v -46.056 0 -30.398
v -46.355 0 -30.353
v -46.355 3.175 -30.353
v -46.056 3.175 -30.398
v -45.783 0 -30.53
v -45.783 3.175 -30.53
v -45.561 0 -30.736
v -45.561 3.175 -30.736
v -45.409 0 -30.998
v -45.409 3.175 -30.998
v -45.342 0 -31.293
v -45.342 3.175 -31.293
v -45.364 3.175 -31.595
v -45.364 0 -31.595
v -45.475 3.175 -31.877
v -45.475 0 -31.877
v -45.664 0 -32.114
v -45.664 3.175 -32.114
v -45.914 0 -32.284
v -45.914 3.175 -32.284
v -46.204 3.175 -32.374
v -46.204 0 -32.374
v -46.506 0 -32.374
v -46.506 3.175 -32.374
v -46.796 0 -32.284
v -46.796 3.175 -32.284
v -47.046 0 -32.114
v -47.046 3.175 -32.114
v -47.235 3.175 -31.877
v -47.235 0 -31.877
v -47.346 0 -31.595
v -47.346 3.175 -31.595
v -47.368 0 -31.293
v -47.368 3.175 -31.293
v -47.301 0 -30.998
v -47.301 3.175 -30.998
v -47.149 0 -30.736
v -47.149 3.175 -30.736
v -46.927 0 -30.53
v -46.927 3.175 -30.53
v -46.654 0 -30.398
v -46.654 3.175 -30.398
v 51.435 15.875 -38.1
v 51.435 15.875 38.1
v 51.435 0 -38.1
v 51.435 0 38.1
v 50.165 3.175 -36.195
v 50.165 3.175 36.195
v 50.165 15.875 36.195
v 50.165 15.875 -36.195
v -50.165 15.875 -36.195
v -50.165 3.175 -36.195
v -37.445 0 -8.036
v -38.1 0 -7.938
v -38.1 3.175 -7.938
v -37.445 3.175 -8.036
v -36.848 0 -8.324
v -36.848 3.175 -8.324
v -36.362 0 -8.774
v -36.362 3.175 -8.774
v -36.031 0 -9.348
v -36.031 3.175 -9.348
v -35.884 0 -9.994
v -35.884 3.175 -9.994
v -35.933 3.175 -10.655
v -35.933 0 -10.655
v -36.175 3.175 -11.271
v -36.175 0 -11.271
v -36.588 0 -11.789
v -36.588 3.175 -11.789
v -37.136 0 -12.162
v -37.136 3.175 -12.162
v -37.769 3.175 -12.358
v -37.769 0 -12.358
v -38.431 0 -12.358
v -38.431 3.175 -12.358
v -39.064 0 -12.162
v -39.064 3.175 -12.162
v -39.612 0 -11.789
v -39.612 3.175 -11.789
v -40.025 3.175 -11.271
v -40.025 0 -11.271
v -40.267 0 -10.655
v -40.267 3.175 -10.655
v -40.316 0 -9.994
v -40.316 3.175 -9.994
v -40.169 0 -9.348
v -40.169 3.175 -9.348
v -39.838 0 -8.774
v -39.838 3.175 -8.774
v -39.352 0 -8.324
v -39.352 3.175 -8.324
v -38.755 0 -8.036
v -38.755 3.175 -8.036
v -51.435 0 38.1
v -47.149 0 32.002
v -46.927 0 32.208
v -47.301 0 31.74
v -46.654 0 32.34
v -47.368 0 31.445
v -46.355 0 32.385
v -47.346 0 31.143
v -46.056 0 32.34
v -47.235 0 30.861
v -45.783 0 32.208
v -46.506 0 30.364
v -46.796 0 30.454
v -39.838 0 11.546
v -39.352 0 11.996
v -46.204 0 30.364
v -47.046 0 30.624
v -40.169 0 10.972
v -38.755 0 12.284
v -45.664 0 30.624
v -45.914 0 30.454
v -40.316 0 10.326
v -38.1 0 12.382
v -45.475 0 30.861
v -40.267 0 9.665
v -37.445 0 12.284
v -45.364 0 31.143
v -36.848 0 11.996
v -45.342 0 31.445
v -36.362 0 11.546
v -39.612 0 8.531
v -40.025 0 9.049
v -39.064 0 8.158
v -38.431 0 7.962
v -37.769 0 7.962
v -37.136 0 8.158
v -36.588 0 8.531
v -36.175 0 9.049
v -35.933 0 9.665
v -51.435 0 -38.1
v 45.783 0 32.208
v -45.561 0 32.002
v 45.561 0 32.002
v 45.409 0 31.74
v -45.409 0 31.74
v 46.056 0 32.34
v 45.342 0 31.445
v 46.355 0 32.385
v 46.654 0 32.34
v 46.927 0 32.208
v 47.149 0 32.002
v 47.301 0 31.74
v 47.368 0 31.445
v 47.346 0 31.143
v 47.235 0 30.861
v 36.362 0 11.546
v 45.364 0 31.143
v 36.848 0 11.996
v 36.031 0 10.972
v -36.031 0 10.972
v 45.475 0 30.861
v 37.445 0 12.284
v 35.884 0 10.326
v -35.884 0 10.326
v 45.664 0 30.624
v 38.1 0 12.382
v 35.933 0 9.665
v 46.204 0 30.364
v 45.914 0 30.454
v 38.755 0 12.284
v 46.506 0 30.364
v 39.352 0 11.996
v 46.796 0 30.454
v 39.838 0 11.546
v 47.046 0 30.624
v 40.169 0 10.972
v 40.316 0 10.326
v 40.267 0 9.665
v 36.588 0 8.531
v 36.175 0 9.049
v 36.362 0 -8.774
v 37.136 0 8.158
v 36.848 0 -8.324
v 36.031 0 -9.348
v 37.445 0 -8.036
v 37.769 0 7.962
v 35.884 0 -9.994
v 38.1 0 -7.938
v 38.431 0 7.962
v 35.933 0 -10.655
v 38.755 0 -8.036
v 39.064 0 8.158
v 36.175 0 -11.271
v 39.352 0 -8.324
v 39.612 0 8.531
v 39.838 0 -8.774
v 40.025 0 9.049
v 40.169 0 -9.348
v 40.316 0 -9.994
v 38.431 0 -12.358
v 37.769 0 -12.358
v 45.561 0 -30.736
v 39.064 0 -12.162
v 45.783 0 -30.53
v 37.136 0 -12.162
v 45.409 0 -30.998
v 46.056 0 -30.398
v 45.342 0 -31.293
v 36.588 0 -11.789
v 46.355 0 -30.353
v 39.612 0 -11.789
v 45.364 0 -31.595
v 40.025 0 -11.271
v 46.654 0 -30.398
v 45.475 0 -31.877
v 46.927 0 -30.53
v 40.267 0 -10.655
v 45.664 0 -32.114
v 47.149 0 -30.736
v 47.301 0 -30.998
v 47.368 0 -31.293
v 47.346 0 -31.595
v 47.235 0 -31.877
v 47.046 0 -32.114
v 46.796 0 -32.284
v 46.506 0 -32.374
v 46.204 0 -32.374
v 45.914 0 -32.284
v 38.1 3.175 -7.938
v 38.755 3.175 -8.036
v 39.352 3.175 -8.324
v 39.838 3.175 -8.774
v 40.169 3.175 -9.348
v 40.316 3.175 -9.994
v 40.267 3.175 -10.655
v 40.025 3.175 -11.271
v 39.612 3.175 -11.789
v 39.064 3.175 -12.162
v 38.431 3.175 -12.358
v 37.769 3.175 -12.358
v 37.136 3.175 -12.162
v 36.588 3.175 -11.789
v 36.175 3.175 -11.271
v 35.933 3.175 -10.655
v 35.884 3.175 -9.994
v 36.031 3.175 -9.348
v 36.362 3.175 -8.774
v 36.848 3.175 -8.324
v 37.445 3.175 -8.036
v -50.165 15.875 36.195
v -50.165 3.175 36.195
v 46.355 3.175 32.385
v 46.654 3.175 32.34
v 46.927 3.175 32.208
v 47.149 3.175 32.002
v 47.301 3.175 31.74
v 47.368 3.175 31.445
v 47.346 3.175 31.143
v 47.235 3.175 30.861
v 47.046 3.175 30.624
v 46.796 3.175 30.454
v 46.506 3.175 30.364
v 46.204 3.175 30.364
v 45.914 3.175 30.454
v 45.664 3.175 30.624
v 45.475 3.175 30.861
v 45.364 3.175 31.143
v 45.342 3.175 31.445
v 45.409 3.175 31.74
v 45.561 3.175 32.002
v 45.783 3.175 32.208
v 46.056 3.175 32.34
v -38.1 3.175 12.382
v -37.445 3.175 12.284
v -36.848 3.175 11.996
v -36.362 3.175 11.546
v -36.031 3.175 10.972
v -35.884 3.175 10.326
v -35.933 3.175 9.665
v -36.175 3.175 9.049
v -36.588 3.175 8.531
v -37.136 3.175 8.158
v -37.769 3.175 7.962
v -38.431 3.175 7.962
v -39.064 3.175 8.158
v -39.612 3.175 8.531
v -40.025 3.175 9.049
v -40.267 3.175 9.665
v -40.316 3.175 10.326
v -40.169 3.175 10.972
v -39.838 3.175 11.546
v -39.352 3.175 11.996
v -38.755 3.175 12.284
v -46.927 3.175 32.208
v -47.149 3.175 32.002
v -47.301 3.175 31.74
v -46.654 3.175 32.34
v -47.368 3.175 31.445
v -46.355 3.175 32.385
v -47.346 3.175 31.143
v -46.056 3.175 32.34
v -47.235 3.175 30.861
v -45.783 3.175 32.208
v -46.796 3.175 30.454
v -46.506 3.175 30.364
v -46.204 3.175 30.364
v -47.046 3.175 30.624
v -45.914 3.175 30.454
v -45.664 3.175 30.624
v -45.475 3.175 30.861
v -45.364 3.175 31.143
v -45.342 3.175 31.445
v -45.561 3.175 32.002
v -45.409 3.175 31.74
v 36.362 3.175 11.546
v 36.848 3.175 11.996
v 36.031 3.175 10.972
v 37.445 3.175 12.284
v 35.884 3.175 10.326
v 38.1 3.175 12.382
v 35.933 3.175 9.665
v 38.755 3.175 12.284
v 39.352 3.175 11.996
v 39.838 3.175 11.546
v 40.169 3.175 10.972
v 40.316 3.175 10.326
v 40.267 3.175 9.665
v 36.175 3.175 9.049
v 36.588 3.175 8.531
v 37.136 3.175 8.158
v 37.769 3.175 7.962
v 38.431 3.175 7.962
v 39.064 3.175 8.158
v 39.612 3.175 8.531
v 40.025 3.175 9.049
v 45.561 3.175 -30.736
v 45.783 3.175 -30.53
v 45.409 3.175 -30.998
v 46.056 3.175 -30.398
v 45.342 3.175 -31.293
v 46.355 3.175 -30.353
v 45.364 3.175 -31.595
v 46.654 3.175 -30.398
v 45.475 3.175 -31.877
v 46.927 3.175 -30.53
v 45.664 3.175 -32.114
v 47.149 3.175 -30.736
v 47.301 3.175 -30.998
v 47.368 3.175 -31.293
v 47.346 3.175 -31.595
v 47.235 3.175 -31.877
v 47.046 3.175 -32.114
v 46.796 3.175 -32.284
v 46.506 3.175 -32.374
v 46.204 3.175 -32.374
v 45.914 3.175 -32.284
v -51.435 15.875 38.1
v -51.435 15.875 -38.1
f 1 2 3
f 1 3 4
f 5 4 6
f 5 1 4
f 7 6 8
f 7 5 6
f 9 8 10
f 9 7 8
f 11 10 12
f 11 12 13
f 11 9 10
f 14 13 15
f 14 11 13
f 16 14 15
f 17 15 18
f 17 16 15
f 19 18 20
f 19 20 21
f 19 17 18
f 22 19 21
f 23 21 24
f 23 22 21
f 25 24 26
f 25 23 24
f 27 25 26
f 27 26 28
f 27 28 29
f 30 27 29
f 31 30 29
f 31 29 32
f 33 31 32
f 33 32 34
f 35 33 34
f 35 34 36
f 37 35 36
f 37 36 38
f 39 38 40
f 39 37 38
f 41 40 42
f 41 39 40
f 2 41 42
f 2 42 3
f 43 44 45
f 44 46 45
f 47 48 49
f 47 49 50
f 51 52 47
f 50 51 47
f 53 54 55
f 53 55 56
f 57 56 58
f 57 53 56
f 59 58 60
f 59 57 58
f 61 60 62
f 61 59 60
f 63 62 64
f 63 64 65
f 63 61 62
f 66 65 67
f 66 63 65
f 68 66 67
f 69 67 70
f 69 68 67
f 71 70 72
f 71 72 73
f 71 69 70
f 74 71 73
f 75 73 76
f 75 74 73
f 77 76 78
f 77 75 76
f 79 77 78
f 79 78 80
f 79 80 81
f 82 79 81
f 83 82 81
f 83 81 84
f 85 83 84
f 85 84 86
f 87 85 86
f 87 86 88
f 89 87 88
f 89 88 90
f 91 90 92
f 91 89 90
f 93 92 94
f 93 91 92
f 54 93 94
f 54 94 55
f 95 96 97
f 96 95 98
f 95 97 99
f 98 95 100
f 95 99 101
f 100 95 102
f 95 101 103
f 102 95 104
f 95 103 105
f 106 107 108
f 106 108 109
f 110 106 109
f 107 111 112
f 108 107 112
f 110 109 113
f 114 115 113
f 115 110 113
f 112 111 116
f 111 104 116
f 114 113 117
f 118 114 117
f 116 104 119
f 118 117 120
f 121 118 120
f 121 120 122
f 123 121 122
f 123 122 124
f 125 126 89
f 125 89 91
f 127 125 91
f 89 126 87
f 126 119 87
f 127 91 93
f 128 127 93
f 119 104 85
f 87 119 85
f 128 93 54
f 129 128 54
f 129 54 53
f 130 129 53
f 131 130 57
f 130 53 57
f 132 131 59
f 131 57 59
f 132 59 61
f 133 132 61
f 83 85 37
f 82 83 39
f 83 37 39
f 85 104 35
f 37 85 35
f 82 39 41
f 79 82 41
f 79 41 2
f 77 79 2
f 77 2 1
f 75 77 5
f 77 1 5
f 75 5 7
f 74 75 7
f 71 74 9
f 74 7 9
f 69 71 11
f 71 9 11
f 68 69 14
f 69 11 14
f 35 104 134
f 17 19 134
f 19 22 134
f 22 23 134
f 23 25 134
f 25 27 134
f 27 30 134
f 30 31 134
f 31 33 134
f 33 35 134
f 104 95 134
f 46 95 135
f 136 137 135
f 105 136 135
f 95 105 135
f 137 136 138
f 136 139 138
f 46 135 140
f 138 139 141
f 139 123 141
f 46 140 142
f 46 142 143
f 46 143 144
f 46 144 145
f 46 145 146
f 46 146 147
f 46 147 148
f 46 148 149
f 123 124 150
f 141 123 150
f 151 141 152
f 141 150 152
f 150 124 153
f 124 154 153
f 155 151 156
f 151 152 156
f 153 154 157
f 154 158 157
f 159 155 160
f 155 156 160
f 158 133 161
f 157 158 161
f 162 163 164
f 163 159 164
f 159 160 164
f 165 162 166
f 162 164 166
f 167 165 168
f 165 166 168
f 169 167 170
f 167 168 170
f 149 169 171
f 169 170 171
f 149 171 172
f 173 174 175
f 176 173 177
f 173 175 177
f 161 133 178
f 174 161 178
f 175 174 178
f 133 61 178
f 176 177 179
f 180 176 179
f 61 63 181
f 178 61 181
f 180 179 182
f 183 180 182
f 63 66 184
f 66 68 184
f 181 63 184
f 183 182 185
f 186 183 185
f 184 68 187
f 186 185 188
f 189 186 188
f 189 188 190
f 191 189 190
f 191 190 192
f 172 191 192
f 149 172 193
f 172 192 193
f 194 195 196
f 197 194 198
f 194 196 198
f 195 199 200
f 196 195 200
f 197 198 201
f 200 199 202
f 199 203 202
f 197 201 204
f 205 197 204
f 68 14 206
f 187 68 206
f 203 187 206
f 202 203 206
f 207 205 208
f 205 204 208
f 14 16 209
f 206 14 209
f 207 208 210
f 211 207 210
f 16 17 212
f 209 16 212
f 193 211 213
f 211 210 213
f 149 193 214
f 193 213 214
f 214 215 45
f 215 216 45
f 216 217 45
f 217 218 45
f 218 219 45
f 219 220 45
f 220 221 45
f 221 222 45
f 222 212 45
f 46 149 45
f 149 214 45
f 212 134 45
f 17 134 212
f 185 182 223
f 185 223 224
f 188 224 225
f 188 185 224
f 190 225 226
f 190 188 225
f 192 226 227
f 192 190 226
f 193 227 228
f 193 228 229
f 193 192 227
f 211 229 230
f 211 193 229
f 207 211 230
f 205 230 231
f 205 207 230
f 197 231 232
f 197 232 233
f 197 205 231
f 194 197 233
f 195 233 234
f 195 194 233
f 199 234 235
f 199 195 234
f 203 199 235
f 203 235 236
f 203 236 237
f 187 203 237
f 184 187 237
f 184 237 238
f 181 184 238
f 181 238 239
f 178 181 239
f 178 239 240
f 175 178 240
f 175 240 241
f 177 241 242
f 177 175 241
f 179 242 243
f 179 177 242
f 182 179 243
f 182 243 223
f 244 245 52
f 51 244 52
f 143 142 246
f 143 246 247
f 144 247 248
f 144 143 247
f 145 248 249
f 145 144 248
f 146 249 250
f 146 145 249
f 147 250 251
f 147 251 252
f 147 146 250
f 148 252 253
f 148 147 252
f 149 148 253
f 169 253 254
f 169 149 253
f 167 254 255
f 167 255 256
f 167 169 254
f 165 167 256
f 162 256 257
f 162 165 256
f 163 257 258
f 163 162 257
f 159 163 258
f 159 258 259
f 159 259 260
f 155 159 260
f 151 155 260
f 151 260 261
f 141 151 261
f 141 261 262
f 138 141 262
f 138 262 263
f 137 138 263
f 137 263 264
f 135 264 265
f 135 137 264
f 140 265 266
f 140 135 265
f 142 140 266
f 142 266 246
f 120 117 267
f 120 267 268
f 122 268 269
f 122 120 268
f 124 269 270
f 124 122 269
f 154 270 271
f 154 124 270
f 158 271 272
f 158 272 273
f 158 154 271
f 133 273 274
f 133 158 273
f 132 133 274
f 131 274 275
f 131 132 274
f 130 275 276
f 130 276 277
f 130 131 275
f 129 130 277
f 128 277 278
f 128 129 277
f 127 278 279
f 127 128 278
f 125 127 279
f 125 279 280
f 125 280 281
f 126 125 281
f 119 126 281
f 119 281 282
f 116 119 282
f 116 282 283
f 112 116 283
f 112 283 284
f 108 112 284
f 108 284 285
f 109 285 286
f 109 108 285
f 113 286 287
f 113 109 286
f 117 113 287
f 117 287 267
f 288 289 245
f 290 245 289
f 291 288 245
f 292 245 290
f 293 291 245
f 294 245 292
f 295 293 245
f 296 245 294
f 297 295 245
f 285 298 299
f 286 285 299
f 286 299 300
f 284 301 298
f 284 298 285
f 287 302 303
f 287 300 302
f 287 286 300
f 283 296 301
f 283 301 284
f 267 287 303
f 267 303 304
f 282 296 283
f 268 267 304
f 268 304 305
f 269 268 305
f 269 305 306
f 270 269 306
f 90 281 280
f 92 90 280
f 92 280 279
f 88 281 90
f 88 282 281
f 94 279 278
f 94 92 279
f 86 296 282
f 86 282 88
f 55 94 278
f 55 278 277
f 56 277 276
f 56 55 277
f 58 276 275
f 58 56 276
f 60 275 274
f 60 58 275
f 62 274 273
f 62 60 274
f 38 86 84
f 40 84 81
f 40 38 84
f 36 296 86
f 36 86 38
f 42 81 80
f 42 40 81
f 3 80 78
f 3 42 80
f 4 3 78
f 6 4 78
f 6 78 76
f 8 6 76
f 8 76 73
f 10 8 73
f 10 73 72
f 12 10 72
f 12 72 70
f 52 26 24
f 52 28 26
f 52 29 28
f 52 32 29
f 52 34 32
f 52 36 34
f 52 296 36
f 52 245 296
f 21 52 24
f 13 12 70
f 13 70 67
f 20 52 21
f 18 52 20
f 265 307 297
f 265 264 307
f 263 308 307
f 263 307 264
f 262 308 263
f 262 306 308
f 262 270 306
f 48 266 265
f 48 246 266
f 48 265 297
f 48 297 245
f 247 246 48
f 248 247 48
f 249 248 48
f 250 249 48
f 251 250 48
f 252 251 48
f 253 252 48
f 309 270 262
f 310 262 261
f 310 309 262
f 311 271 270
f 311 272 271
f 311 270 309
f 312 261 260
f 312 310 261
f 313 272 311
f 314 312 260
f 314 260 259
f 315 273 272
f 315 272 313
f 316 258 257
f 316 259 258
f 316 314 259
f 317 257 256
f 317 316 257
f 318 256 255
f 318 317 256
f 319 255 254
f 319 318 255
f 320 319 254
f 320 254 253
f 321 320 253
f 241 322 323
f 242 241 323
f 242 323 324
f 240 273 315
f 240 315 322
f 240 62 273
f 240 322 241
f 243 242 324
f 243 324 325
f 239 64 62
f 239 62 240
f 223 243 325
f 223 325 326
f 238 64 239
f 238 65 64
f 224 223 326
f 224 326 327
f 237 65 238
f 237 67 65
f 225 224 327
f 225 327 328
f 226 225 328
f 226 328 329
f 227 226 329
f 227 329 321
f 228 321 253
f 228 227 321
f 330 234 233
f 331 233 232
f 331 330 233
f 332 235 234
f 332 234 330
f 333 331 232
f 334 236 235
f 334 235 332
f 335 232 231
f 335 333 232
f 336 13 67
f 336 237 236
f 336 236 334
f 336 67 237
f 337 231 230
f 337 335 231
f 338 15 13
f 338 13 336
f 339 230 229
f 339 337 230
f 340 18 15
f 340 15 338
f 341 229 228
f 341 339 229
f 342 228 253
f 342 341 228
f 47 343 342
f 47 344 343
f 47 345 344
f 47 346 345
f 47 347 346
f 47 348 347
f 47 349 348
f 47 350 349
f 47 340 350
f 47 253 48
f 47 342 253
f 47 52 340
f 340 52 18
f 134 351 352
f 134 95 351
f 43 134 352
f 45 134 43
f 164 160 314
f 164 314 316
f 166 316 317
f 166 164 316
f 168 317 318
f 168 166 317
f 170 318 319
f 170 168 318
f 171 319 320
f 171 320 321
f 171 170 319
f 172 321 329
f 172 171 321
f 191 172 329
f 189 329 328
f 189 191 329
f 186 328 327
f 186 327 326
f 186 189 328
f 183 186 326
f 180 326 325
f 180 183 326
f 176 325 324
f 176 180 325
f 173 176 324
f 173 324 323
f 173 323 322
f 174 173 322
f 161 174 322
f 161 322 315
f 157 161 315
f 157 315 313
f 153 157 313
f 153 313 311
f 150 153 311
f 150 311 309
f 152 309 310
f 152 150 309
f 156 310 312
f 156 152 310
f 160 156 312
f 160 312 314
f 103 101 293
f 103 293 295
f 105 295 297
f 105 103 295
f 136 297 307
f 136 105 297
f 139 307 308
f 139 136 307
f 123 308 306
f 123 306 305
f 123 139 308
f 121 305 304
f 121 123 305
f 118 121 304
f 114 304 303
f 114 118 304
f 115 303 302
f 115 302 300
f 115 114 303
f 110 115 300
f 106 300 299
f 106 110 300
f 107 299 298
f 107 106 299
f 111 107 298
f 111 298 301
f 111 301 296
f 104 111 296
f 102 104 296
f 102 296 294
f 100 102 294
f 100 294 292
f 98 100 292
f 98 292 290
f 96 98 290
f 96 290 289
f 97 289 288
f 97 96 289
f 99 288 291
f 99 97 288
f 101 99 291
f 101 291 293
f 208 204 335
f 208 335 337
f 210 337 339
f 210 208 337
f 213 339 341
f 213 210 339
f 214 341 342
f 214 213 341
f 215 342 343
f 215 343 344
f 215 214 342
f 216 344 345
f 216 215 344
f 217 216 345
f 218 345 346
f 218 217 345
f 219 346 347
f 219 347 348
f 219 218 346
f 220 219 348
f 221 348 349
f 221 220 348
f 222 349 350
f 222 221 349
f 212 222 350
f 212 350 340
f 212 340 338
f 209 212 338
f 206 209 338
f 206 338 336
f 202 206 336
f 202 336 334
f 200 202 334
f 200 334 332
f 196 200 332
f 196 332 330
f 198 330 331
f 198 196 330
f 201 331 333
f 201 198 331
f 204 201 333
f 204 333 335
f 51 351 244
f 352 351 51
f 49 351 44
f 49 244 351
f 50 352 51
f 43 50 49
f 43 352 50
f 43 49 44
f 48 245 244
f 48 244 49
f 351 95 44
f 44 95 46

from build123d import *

# Parameters (mm, degrees)
SKETCH1_W           = 102.87
SKETCH1_H           = 76.2
SKETCH1_R           = 2.2225
SKETCH1_R_2         = 1.016
BOSS_EXTRUDE1_DEPTH = 3.175
SKETCH2_W           = 102.87
SKETCH2_H           = 76.2
SKETCH2_W_2         = 100.33
SKETCH2_H_2         = 72.39
BOSS_EXTRUDE3_DEPTH = 12.7


with BuildPart() as part:
    # Sketch1 → Boss-Extrude1 (new body)
    with BuildSketch(Plane(origin=(0, 0, 0), x_dir=(1, 0, 0), z_dir=(0, 1, 0))):
        Rectangle(SKETCH1_W, SKETCH1_H)
        with Locations((-38.1, -10.16)):
            Circle(SKETCH1_R, mode=Mode.SUBTRACT)
        with Locations((38.1, -10.16)):
            Circle(SKETCH1_R, mode=Mode.SUBTRACT)
        with Locations((-38.1, 10.16)):
            Circle(SKETCH1_R, mode=Mode.SUBTRACT)
        with Locations((38.1, 10.16)):
            Circle(SKETCH1_R, mode=Mode.SUBTRACT)
        with Locations((-46.355, 31.369)):
            Circle(SKETCH1_R_2, mode=Mode.SUBTRACT)
        with Locations((-46.355, -31.369)):
            Circle(SKETCH1_R_2, mode=Mode.SUBTRACT)
        with Locations((46.355, 31.369)):
            Circle(SKETCH1_R_2, mode=Mode.SUBTRACT)
        with Locations((46.355, -31.369)):
            Circle(SKETCH1_R_2, mode=Mode.SUBTRACT)
    extrude(amount=BOSS_EXTRUDE1_DEPTH)

    # Sketch2 → Boss-Extrude3 (add)
    with BuildSketch(Plane(origin=(0, 3.175, 0), x_dir=(1, 0, 0), z_dir=(0, 1, 0))):
        Rectangle(SKETCH2_W, SKETCH2_H)
        Rectangle(SKETCH2_W_2, SKETCH2_H_2, mode=Mode.SUBTRACT)
    extrude(amount=BOSS_EXTRUDE3_DEPTH)


solid = part.part
